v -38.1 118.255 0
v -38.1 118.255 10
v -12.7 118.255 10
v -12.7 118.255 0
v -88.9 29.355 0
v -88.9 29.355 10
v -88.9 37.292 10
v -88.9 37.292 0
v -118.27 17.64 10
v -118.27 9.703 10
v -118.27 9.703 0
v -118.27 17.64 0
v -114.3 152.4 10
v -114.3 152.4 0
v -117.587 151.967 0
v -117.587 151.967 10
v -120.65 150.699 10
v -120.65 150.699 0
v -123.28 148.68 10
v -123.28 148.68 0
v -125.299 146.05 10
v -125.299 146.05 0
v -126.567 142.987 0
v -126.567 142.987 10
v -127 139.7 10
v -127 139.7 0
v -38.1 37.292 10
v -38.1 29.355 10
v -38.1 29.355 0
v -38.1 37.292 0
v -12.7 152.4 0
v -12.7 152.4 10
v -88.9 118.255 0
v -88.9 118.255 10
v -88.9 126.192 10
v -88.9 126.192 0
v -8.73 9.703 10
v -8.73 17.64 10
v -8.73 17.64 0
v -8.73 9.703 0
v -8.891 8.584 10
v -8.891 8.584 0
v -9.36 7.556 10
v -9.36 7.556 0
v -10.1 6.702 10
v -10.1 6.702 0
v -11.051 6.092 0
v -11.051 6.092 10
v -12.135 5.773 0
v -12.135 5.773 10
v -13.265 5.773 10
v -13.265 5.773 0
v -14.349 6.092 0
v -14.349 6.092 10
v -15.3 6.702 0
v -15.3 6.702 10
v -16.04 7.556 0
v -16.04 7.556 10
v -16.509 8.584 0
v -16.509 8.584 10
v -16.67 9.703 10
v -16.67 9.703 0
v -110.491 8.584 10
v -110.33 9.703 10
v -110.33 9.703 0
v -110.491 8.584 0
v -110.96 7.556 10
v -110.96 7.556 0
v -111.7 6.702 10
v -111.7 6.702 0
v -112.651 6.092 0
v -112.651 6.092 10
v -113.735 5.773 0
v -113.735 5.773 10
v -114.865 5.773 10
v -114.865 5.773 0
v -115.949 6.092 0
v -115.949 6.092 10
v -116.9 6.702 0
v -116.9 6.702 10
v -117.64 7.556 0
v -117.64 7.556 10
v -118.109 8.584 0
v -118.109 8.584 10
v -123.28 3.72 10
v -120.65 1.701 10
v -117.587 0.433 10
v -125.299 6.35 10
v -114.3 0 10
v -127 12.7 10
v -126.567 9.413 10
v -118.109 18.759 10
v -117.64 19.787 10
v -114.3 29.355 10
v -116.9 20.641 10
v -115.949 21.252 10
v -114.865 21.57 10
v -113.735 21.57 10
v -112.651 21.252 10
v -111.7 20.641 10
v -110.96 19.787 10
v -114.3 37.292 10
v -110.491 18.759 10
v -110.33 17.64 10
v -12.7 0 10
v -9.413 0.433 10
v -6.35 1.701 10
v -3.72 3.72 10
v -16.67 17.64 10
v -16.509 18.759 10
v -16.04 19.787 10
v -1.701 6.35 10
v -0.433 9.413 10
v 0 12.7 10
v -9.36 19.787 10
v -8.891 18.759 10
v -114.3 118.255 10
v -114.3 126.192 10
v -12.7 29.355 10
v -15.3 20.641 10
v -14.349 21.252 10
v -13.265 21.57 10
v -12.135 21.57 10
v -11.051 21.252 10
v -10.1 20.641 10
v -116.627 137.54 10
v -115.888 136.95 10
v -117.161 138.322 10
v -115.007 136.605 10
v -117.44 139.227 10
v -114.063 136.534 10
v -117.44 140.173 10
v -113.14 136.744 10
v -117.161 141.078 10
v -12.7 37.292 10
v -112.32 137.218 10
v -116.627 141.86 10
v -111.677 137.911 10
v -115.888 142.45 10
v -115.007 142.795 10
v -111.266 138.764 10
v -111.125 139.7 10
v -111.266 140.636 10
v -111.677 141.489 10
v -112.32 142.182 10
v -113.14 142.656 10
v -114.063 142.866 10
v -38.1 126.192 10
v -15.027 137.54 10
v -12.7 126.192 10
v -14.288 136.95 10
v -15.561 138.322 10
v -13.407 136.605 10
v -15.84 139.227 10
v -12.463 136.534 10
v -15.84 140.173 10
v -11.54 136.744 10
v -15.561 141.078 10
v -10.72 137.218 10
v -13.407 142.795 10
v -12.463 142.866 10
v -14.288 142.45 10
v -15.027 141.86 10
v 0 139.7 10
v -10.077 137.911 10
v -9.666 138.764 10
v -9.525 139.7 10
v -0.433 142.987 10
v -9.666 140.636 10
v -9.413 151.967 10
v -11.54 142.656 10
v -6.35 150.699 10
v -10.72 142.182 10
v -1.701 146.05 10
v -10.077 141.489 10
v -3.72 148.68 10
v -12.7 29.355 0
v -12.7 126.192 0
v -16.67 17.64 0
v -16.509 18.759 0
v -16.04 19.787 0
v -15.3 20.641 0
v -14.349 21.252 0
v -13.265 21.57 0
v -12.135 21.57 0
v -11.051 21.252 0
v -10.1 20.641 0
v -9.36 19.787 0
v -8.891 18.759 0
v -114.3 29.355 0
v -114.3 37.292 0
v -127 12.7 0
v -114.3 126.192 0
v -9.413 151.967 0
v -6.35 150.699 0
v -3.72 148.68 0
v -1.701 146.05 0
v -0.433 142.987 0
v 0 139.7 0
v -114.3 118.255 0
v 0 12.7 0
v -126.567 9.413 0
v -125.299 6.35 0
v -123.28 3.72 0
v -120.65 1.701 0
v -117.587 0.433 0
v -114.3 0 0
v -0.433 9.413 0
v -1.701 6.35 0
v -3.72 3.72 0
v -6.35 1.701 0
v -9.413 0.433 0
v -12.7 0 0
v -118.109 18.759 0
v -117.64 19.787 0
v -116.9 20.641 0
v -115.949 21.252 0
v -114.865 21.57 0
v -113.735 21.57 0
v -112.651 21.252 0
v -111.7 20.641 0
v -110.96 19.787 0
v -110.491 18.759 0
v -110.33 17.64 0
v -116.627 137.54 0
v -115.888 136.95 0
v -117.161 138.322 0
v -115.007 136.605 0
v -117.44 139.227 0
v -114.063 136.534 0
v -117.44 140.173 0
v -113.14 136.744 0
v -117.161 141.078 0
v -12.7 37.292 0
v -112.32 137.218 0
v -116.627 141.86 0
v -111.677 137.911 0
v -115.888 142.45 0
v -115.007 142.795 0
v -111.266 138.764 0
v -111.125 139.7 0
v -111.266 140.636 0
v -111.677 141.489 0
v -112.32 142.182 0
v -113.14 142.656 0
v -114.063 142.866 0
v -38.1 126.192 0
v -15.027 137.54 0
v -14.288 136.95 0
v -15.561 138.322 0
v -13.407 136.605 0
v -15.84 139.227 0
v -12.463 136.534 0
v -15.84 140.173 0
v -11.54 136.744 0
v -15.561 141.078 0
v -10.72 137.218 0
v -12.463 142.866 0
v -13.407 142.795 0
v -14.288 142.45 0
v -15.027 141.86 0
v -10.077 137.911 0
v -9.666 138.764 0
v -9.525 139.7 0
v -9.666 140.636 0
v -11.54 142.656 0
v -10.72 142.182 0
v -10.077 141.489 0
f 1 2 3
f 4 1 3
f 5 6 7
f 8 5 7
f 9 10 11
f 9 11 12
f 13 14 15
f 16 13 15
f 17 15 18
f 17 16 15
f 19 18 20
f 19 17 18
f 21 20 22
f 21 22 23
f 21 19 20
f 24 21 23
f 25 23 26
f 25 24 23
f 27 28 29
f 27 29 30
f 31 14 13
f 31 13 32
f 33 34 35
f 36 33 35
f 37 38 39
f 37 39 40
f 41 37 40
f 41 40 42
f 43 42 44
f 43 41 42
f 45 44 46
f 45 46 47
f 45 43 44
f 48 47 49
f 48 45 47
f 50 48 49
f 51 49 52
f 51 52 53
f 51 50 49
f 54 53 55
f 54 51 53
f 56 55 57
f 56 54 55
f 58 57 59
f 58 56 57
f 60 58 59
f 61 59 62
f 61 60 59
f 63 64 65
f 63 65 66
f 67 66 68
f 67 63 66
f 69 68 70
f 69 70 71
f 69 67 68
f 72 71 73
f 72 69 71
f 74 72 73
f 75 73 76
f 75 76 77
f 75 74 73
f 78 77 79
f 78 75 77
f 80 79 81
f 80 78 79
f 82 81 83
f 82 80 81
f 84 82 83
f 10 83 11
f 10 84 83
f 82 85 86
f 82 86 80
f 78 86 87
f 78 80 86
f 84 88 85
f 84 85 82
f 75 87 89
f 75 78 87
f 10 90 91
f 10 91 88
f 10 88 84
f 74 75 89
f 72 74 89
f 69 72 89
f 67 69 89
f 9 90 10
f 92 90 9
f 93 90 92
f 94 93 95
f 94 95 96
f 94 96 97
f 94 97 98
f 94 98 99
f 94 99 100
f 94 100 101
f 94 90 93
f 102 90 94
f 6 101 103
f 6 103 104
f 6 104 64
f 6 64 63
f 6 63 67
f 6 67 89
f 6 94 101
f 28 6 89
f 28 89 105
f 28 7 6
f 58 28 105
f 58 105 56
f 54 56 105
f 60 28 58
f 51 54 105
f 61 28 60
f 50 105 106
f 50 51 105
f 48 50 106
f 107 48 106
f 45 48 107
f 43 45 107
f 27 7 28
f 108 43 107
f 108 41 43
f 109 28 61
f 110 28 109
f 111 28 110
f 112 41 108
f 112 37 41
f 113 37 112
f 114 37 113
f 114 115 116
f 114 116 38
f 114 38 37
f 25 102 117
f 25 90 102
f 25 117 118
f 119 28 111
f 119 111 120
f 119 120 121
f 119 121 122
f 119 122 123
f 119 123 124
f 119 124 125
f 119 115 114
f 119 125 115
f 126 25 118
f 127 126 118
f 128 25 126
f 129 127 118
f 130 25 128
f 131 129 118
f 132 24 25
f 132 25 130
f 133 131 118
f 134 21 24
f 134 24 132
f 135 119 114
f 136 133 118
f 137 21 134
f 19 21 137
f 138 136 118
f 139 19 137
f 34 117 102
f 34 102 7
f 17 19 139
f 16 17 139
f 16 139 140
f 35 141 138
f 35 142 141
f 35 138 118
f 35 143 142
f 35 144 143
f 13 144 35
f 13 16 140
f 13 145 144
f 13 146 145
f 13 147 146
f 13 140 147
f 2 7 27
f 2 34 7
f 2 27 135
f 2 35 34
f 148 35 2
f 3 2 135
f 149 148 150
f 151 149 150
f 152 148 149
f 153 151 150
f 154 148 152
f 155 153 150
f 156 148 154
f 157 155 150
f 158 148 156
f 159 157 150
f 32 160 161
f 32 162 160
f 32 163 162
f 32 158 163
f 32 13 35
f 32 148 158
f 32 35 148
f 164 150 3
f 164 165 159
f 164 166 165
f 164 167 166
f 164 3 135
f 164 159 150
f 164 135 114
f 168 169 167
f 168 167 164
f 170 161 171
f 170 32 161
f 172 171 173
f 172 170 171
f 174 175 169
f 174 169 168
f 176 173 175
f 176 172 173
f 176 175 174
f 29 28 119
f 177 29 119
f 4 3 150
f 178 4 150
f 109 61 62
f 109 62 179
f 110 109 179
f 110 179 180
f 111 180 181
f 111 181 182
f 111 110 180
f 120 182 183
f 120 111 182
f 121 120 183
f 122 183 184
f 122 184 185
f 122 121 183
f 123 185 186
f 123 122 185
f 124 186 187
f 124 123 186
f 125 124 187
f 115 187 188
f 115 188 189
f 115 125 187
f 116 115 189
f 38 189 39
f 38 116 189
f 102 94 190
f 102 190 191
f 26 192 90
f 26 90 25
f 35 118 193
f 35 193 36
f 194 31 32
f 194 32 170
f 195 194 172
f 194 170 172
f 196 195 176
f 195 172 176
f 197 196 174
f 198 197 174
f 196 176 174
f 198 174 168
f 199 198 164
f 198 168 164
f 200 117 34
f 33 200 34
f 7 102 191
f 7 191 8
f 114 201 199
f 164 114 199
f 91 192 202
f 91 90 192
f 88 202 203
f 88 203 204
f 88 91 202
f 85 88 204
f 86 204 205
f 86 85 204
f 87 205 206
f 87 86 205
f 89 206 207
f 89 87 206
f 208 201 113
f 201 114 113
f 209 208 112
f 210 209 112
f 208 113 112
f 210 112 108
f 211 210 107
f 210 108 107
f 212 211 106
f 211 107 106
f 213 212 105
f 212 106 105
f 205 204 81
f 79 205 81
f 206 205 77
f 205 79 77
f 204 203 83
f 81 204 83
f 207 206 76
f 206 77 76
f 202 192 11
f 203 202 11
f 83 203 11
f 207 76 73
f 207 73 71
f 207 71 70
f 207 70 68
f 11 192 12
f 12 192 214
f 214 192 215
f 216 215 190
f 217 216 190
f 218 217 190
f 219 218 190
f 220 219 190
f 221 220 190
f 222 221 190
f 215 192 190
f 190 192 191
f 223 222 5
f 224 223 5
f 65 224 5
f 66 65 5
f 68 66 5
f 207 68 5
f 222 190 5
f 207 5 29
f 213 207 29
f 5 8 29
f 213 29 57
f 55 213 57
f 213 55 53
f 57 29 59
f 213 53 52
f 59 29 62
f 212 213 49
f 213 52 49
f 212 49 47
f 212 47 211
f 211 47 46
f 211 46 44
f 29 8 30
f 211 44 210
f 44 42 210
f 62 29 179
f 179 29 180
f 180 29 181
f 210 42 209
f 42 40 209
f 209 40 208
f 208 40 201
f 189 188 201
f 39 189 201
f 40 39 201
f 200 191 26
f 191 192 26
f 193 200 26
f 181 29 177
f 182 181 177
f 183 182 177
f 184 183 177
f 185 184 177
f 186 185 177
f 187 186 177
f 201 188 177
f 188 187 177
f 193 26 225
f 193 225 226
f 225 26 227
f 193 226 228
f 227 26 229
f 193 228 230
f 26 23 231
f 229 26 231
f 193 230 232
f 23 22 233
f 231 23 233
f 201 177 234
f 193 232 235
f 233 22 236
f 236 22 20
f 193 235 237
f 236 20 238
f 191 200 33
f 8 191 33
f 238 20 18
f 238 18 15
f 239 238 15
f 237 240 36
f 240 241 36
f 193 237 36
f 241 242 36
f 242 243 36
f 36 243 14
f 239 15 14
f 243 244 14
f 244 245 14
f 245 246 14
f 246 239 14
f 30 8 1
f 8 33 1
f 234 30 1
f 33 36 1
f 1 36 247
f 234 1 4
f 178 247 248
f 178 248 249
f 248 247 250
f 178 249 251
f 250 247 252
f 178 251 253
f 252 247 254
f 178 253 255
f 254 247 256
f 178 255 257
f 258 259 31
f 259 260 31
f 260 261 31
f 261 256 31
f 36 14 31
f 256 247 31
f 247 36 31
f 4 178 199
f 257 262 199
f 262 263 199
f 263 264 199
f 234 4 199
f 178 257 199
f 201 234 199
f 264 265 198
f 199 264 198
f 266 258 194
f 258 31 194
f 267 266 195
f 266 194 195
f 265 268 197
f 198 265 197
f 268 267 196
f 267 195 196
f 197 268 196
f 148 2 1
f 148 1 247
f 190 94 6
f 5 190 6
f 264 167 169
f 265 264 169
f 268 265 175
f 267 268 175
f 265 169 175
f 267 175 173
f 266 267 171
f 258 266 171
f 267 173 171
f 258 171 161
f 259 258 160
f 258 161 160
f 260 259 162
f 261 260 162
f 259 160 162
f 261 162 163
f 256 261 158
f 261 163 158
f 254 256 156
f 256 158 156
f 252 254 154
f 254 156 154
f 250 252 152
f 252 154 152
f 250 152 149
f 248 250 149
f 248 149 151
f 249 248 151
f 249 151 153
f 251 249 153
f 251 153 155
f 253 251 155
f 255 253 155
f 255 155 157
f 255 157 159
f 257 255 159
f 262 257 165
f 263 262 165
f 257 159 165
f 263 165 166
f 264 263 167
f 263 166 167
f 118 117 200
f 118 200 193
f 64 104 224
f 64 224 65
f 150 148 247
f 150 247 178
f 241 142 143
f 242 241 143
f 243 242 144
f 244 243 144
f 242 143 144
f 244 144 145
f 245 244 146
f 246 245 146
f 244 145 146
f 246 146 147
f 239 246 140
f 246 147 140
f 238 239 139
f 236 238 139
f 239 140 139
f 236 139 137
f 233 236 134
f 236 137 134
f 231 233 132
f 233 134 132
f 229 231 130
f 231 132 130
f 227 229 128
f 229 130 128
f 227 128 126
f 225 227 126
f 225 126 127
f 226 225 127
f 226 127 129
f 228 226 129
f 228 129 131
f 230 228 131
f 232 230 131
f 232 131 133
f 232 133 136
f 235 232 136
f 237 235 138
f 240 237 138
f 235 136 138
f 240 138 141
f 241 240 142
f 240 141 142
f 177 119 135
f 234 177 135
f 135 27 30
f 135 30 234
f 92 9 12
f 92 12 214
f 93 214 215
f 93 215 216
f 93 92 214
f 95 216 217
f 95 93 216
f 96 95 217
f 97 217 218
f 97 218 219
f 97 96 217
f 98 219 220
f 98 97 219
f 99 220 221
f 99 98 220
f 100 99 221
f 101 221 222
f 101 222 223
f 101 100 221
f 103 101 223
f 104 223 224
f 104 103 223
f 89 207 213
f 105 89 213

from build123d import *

# Parameters (mm, degrees)
SKETCH1_W            = 127
SKETCH1_H            = 152.4
BOSS_EXTRUDE1_DEPTH  = 10
SKETCH2_W            = 25.4
SKETCH2_H            = 7.9375
CUT_EXTRUDE1_DEPTH   = 10
LPATTERN1_COUNT      = 2
LPATTERN1_PITCH      = 76.2
LPATTERN1_COUNT_DIR2 = 2
LPATTERN1_PITCH_DIR2 = 88.9
SKETCH3_R            = 3.175
CUT_EXTRUDE2_DEPTH   = 10
LPATTERN2_COUNT      = 2
LPATTERN2_PITCH      = 101.6
CUT_EXTRUDE3_DEPTH   = 10
LPATTERN3_COUNT      = 2
LPATTERN3_PITCH      = 101.6
FILLET1_R            = 12.7
FILLET2_R            = 12.7


with BuildPart() as part:
    # Sketch1 → Boss-Extrude1 (new body)
    with BuildSketch(Plane.XY):
        with Locations((-63.5, 76.2)):
            Rectangle(SKETCH1_W, SKETCH1_H)
    extrude(amount=BOSS_EXTRUDE1_DEPTH)

    # Sketch2 → Cut-Extrude1 (cut)
    with BuildSketch(Plane.XY.offset(10)):
        with Locations((-101.6, 122.22353)):
            Rectangle(SKETCH2_W, SKETCH2_H)
    cut_extrude1 = extrude(amount=-CUT_EXTRUDE1_DEPTH, mode=Mode.SUBTRACT)

    # LPattern1: Cut-Extrude1 2 × 2
    with Locations(*[(i * LPATTERN1_PITCH, -j * LPATTERN1_PITCH_DIR2, 0) for i in range(LPATTERN1_COUNT) for j in range(LPATTERN1_COUNT_DIR2) if (i, j) != (0, 0)]):
        add(cut_extrude1, mode=Mode.SUBTRACT)

    # Sketch3 → Cut-Extrude2 (cut)
    with BuildSketch(Plane.XY.offset(10)):
        with Locations((-114.3, 139.7)):
            Circle(SKETCH3_R)
    cut_extrude2 = extrude(amount=-CUT_EXTRUDE2_DEPTH, mode=Mode.SUBTRACT)

    # LPattern2: Cut-Extrude2 ×2
    with Locations(*[(i * LPATTERN2_PITCH, 0, 0) for i in range(1, LPATTERN2_COUNT)]):
        add(cut_extrude2, mode=Mode.SUBTRACT)

    # Sketch4 → Cut-Extrude3 (cut)
    with BuildSketch(Plane.XY.offset(10)):
        with BuildLine():
            Line((-110.32998, 17.6403), (-110.32998, 9.7028))
            ThreePointArc((-110.32998, 9.7028), (-114.3, 5.73278), (-118.27002, 9.7028))
            Line((-118.27002, 9.7028), (-118.27002, 17.6403))
            ThreePointArc((-118.27002, 17.6403), (-114.3, 21.61032), (-110.32998, 17.6403))
        make_face()
    cut_extrude3 = extrude(amount=-CUT_EXTRUDE3_DEPTH, mode=Mode.SUBTRACT)

    # LPattern3: Cut-Extrude3 ×2
    with Locations(*[(i * LPATTERN3_PITCH, 0, 0) for i in range(1, LPATTERN3_COUNT)]):
        add(cut_extrude3, mode=Mode.SUBTRACT)

    # Fillet1
    fillet1_edges = [part.edges().sort_by_distance(p)[0] for p in [
        (0, 152.4, 5),
    ]]
    fillet(fillet1_edges, radius=FILLET1_R)

    # Fillet2
    fillet2_edges = [part.edges().sort_by_distance(p)[0] for p in [
        (-127, 152.4, 5),
        (0, 0, 5),
        (-127, 0, 5),
    ]]
    fillet(fillet2_edges, radius=FILLET2_R)


solid = part.part
